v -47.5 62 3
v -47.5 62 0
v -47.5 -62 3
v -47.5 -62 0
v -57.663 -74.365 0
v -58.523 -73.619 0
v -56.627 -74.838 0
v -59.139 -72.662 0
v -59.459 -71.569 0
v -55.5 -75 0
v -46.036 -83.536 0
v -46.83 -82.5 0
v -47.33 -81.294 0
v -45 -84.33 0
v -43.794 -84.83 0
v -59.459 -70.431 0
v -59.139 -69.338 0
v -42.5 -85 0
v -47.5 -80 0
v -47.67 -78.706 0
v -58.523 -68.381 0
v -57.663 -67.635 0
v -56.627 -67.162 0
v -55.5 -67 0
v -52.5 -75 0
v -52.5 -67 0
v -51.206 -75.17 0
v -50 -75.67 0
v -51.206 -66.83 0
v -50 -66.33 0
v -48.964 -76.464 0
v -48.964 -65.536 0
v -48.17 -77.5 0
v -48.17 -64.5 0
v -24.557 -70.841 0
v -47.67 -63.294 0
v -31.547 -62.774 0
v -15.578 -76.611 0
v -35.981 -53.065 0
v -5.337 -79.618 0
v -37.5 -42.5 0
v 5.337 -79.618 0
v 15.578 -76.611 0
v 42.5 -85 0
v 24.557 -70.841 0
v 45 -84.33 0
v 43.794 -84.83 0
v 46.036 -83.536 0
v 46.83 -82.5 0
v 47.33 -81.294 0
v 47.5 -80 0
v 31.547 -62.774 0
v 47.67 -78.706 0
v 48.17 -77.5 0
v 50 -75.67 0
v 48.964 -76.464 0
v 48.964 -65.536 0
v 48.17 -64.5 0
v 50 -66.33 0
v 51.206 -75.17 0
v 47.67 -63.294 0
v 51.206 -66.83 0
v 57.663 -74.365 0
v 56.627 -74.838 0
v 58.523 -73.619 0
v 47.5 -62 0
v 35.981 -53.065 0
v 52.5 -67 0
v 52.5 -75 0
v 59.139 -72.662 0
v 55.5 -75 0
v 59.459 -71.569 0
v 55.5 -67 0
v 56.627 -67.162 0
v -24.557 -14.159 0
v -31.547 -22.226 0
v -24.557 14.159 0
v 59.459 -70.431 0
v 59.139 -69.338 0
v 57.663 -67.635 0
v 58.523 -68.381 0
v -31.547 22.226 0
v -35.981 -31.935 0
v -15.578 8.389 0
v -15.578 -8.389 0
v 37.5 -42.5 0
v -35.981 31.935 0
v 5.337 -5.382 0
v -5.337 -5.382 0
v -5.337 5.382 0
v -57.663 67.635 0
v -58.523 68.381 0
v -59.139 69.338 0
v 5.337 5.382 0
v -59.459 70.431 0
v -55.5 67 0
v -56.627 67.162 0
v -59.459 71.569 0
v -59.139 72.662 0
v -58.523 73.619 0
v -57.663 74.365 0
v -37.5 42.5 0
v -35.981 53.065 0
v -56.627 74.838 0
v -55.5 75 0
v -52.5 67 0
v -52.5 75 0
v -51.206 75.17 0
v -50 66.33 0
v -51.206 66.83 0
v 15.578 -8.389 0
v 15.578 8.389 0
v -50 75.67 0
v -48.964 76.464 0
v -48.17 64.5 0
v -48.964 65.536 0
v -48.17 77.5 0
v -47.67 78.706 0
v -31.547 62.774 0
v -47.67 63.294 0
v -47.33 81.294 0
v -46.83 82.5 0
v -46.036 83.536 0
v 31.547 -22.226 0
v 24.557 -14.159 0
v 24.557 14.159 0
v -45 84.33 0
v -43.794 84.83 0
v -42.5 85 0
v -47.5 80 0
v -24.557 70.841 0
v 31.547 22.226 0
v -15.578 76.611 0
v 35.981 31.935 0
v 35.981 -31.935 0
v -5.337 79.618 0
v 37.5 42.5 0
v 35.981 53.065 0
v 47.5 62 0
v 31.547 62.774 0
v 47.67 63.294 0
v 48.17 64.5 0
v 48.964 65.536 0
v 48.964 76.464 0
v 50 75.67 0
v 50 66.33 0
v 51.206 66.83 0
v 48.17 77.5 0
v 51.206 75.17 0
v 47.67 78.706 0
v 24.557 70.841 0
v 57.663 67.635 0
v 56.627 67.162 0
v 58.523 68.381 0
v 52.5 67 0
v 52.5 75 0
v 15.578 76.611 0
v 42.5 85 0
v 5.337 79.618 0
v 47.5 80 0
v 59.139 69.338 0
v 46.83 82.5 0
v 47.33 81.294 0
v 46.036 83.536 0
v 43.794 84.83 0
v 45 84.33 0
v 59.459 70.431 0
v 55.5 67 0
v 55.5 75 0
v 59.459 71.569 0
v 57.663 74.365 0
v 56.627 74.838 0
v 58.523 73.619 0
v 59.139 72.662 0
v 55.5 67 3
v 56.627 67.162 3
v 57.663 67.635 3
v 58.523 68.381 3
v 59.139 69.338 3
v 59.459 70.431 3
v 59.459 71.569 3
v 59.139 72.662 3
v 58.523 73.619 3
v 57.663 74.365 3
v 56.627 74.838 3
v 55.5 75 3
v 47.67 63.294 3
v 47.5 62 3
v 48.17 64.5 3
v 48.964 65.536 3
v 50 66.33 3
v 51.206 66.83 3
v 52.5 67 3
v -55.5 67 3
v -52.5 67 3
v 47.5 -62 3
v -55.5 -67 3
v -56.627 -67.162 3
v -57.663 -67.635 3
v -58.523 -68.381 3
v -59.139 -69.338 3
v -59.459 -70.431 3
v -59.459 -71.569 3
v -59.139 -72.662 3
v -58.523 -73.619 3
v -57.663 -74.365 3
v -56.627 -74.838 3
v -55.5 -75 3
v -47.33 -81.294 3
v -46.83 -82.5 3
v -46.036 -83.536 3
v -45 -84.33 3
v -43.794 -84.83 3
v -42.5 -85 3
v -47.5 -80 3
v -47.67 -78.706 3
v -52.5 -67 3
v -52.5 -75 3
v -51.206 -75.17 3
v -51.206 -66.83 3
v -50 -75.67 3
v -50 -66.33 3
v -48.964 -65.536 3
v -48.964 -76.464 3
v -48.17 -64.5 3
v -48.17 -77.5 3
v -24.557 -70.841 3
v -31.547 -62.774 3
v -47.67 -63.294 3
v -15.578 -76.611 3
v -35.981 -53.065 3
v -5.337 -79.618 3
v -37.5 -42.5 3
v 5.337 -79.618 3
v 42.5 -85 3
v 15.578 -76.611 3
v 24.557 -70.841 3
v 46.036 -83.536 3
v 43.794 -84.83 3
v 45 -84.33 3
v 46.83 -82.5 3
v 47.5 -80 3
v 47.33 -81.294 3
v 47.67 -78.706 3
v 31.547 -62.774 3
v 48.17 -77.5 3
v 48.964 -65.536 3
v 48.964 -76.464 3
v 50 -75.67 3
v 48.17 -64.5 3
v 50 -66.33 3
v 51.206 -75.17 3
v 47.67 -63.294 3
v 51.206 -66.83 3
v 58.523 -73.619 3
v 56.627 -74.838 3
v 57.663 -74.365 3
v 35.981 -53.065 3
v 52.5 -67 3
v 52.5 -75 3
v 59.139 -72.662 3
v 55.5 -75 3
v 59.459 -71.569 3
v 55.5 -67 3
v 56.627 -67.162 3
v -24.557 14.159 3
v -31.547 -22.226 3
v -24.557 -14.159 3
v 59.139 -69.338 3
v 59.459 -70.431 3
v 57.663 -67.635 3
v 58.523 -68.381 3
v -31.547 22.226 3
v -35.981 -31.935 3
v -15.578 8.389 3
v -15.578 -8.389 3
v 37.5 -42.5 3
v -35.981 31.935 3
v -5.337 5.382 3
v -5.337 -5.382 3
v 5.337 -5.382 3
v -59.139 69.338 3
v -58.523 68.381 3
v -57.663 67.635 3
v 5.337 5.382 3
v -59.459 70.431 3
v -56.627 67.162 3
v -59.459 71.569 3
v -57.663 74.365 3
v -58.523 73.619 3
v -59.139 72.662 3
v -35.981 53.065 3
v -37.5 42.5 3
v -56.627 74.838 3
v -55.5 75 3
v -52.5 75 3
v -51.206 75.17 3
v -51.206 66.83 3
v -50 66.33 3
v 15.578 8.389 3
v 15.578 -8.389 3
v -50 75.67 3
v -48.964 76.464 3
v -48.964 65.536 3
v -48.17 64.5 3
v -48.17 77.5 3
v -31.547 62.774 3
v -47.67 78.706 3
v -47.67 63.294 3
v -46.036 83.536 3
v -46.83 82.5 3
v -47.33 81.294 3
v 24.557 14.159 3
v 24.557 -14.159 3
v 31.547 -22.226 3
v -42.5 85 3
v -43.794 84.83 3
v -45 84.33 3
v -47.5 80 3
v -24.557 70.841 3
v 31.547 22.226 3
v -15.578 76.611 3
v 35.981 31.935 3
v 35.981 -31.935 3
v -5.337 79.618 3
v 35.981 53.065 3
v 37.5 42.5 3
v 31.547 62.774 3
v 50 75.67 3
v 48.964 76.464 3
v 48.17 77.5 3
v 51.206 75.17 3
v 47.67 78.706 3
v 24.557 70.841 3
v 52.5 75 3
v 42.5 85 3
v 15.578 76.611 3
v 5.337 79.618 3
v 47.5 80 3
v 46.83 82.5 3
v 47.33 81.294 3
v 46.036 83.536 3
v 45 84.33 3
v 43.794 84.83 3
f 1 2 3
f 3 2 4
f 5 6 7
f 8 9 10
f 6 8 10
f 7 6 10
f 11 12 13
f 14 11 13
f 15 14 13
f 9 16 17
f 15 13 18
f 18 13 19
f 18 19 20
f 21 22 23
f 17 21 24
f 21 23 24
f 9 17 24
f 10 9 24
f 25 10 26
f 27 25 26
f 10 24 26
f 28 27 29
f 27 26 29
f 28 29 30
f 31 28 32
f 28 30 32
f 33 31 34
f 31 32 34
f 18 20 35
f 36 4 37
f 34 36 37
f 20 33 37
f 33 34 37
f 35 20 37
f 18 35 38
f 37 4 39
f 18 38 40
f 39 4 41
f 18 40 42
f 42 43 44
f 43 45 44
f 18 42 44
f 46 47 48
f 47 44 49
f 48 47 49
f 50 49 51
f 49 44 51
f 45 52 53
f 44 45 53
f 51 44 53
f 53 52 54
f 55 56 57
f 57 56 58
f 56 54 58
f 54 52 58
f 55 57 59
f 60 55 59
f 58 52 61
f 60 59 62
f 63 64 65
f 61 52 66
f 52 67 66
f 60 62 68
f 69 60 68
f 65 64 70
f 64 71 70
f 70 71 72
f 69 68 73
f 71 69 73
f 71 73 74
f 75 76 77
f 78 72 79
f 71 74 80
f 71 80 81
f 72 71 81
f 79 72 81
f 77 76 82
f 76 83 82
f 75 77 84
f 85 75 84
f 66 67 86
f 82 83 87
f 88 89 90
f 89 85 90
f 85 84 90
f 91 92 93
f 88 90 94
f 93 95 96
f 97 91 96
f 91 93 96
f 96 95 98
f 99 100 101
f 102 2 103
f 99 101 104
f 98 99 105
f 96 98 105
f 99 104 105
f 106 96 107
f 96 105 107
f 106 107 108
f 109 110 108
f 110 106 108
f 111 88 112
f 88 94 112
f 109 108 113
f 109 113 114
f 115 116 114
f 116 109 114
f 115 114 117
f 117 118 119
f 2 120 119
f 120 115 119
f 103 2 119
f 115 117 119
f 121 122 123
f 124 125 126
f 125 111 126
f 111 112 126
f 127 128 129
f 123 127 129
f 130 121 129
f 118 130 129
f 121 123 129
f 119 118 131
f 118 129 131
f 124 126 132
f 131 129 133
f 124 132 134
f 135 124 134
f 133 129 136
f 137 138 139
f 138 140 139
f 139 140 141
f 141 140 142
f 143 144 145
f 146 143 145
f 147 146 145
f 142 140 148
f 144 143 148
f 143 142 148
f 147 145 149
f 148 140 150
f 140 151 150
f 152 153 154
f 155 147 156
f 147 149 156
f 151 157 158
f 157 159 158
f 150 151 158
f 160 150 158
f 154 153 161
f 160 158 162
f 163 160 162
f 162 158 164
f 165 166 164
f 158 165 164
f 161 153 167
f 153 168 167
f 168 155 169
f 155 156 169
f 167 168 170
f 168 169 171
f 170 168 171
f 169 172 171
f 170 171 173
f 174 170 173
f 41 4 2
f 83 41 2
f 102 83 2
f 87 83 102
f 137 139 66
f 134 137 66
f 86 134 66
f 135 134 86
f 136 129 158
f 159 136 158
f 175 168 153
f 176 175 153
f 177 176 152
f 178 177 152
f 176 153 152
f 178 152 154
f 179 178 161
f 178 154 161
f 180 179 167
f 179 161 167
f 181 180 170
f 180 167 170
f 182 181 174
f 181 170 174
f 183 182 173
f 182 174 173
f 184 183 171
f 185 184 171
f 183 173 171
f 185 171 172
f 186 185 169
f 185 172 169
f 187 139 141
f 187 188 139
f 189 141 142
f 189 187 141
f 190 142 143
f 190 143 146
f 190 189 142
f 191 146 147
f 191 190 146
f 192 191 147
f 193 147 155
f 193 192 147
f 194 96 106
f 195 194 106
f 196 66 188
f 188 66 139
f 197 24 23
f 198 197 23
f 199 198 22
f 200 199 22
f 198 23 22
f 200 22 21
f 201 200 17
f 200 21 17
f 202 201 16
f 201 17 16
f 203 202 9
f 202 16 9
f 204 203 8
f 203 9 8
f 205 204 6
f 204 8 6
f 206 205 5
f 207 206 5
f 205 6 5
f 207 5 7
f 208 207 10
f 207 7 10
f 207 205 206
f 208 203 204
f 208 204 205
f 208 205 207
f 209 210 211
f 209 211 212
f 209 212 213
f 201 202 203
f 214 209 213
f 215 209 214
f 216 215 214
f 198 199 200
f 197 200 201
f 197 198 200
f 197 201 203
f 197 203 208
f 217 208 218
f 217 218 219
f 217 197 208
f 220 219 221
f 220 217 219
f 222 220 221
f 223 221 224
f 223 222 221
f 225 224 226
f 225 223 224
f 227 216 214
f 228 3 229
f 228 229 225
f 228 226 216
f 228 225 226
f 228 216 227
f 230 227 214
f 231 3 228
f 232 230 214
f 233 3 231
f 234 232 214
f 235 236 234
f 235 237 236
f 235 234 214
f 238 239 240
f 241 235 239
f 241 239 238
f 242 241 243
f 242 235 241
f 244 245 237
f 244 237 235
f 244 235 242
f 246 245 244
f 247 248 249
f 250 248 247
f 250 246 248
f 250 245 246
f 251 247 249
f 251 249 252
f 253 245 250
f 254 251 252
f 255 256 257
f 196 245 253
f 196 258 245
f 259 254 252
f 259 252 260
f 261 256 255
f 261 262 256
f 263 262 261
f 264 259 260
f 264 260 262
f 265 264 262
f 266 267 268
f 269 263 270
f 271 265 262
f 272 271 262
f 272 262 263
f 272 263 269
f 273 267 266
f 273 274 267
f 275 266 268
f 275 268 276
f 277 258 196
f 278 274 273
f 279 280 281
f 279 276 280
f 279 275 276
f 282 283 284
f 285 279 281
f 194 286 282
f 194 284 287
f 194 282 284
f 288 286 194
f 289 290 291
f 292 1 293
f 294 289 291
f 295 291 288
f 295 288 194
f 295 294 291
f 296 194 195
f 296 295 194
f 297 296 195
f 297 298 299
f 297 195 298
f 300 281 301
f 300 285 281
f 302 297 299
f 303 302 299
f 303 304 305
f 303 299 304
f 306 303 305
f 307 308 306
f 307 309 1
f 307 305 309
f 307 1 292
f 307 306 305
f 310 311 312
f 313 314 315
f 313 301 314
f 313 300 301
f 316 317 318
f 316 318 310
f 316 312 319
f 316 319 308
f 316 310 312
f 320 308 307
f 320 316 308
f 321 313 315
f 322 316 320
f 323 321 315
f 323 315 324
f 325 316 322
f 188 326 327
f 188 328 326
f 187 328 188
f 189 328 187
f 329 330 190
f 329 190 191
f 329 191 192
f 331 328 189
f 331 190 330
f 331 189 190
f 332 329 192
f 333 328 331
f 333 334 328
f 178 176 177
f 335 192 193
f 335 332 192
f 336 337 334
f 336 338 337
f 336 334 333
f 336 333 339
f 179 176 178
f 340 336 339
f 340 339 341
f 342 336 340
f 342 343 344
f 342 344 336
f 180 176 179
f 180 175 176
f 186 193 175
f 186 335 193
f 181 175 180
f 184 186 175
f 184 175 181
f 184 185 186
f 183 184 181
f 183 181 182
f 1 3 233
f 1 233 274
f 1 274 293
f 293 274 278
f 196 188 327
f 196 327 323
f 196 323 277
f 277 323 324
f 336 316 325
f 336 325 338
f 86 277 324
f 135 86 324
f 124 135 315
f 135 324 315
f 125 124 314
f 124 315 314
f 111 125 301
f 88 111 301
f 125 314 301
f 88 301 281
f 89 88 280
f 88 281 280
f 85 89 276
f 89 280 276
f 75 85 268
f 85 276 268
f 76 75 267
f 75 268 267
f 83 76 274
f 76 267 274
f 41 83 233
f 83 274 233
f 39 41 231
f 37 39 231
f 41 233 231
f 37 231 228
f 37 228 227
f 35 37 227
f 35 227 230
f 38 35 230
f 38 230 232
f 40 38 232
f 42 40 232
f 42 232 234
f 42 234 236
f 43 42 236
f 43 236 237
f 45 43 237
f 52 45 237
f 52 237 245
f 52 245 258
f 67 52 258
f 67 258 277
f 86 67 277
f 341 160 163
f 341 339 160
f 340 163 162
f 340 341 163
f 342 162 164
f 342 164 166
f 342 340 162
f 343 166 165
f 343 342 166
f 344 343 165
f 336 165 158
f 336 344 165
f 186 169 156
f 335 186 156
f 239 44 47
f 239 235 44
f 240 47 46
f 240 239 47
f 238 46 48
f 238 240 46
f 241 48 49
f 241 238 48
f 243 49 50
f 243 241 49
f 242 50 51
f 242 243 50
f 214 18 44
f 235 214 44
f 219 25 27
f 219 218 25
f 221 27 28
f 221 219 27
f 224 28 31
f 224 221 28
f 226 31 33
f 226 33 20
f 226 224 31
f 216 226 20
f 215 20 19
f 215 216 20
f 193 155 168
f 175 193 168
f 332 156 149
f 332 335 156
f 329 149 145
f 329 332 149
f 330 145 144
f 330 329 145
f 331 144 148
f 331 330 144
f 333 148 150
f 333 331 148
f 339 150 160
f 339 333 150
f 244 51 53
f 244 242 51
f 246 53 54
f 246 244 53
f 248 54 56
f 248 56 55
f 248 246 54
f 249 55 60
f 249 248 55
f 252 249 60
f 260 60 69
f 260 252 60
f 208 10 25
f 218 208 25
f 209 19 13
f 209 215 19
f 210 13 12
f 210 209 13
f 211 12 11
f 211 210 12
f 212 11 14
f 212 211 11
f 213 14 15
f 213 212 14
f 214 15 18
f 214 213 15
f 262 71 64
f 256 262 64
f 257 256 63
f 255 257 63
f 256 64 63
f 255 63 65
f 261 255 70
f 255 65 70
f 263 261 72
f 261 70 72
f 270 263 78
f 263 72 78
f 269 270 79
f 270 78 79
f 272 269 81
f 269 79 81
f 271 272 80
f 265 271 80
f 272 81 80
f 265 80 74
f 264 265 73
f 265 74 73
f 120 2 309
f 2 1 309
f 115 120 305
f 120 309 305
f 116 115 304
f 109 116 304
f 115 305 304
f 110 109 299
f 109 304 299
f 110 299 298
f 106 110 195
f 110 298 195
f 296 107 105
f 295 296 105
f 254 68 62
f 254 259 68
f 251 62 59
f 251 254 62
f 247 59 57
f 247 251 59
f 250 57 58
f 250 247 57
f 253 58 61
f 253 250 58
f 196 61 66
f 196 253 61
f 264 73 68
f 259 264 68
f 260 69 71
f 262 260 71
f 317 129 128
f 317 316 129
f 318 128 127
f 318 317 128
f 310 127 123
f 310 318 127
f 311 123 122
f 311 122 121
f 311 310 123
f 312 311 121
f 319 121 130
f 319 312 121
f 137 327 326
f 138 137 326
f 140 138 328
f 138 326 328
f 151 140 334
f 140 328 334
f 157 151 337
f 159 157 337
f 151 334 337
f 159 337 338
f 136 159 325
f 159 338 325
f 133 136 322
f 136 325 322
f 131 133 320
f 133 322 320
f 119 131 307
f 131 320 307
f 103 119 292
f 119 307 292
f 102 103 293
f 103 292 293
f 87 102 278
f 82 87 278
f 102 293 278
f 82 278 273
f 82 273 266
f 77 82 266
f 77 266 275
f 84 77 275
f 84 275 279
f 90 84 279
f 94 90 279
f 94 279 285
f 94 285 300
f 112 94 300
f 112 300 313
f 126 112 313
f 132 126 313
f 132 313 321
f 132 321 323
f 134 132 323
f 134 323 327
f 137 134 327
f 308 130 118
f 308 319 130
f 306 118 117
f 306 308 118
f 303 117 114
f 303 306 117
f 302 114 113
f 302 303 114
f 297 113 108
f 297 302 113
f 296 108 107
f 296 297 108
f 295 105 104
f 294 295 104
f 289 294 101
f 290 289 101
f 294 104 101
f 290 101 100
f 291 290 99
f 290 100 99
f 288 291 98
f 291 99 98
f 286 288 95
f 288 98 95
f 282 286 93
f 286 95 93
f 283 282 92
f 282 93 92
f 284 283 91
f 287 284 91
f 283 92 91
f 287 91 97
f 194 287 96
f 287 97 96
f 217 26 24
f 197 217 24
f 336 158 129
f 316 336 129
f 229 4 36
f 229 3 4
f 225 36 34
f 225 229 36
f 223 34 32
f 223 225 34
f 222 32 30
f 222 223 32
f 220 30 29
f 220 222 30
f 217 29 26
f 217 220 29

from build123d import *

# Parameters (mm, degrees)
EXTRUDE_1_DEPTH     = 3
FILLET_1_R          = 5
CUT_EXTRUDE_1_REACH = 105.799
SKETCH_2_R          = 37.5


with BuildPart() as part:
    # 草圖1 → 填料-伸長1 (new body)
    with BuildSketch(Plane.XY):
        with BuildLine():
            Line((-47.5, 67), (-47.5, -67))
            Line((-47.5, -67), (-55.5, -67))
            ThreePointArc((-55.5, -67), (-59.5, -71), (-55.5, -75))
            Line((-55.5, -75), (-47.5, -75))
            Line((-47.5, -75), (-47.5, -85))
            Line((-47.5, -85), (47.5, -85))
            Line((47.5, -85), (47.5, -75))
            Line((47.5, -75), (55.5, -75))
            ThreePointArc((55.5, -75), (59.5, -71), (55.5, -67))
            Line((55.5, -67), (47.5, -67))
            Line((47.5, -67), (47.5, 67))
            Line((47.5, 67), (55.5, 67))
            ThreePointArc((55.5, 67), (59.5, 71), (55.5, 75))
            Line((55.5, 75), (47.5, 75))
            Line((47.5, 75), (47.5, 85))
            Line((47.5, 85), (-47.5, 85))
            Line((-47.5, 85), (-47.5, 75))
            Line((-47.5, 75), (-55.5, 75))
            ThreePointArc((-55.5, 75), (-59.5, 71), (-55.5, 67))
            Line((-55.5, 67), (-47.5, 67))
        make_face()
    extrude(amount=EXTRUDE_1_DEPTH)

    # 圓角1
    fillet_1_edges = [part.edges().sort_by_distance(p)[0] for p in [
        (-47.5, 85, 1.5),
        (47.5, 85, 1.5),
        (47.5, 75, 1.5),
        (47.5, 67, 1.5),
        (47.5, -67, 1.5),
        (47.5, -75, 1.5),
        (47.5, -85, 1.5),
        (-47.5, -85, 1.5),
        (-47.5, -75, 1.5),
        (-47.5, -67, 1.5),
        (-47.5, 67, 1.5),
        (-47.5, 75, 1.5),
    ]]
    fillet(fillet_1_edges, radius=FILLET_1_R - 0.0001)  # a hair under: the kernel refuses the full size

    # 草圖2 → 除料-伸長1 (cut, up to next)
    with BuildSketch(Plane.XY.offset(3), mode=Mode.PRIVATE) as cut_extrude_1_sk1:
        with Locations((0, 42.5)):
            Circle(SKETCH_2_R)
    cut_extrude_1_tool1 = extrude(cut_extrude_1_sk1.sketch, amount=-CUT_EXTRUDE_1_REACH, mode=Mode.PRIVATE) & part.part
    # 草圖2 → 除料-伸長1 (cut, up to next)
    with BuildSketch(Plane.XY.offset(3), mode=Mode.PRIVATE) as cut_extrude_1_sk2:
        with Locations((0, -42.5)):
            Circle(SKETCH_2_R)
    cut_extrude_1_tool2 = extrude(cut_extrude_1_sk2.sketch, amount=-CUT_EXTRUDE_1_REACH, mode=Mode.PRIVATE) & part.part
    add(cut_extrude_1_tool1.solids().sort_by_distance((0, 42.5, 3))[0], mode=Mode.SUBTRACT)
    add(cut_extrude_1_tool2.solids().sort_by_distance((0, -42.5, 3))[0], mode=Mode.SUBTRACT)


solid = part.part
